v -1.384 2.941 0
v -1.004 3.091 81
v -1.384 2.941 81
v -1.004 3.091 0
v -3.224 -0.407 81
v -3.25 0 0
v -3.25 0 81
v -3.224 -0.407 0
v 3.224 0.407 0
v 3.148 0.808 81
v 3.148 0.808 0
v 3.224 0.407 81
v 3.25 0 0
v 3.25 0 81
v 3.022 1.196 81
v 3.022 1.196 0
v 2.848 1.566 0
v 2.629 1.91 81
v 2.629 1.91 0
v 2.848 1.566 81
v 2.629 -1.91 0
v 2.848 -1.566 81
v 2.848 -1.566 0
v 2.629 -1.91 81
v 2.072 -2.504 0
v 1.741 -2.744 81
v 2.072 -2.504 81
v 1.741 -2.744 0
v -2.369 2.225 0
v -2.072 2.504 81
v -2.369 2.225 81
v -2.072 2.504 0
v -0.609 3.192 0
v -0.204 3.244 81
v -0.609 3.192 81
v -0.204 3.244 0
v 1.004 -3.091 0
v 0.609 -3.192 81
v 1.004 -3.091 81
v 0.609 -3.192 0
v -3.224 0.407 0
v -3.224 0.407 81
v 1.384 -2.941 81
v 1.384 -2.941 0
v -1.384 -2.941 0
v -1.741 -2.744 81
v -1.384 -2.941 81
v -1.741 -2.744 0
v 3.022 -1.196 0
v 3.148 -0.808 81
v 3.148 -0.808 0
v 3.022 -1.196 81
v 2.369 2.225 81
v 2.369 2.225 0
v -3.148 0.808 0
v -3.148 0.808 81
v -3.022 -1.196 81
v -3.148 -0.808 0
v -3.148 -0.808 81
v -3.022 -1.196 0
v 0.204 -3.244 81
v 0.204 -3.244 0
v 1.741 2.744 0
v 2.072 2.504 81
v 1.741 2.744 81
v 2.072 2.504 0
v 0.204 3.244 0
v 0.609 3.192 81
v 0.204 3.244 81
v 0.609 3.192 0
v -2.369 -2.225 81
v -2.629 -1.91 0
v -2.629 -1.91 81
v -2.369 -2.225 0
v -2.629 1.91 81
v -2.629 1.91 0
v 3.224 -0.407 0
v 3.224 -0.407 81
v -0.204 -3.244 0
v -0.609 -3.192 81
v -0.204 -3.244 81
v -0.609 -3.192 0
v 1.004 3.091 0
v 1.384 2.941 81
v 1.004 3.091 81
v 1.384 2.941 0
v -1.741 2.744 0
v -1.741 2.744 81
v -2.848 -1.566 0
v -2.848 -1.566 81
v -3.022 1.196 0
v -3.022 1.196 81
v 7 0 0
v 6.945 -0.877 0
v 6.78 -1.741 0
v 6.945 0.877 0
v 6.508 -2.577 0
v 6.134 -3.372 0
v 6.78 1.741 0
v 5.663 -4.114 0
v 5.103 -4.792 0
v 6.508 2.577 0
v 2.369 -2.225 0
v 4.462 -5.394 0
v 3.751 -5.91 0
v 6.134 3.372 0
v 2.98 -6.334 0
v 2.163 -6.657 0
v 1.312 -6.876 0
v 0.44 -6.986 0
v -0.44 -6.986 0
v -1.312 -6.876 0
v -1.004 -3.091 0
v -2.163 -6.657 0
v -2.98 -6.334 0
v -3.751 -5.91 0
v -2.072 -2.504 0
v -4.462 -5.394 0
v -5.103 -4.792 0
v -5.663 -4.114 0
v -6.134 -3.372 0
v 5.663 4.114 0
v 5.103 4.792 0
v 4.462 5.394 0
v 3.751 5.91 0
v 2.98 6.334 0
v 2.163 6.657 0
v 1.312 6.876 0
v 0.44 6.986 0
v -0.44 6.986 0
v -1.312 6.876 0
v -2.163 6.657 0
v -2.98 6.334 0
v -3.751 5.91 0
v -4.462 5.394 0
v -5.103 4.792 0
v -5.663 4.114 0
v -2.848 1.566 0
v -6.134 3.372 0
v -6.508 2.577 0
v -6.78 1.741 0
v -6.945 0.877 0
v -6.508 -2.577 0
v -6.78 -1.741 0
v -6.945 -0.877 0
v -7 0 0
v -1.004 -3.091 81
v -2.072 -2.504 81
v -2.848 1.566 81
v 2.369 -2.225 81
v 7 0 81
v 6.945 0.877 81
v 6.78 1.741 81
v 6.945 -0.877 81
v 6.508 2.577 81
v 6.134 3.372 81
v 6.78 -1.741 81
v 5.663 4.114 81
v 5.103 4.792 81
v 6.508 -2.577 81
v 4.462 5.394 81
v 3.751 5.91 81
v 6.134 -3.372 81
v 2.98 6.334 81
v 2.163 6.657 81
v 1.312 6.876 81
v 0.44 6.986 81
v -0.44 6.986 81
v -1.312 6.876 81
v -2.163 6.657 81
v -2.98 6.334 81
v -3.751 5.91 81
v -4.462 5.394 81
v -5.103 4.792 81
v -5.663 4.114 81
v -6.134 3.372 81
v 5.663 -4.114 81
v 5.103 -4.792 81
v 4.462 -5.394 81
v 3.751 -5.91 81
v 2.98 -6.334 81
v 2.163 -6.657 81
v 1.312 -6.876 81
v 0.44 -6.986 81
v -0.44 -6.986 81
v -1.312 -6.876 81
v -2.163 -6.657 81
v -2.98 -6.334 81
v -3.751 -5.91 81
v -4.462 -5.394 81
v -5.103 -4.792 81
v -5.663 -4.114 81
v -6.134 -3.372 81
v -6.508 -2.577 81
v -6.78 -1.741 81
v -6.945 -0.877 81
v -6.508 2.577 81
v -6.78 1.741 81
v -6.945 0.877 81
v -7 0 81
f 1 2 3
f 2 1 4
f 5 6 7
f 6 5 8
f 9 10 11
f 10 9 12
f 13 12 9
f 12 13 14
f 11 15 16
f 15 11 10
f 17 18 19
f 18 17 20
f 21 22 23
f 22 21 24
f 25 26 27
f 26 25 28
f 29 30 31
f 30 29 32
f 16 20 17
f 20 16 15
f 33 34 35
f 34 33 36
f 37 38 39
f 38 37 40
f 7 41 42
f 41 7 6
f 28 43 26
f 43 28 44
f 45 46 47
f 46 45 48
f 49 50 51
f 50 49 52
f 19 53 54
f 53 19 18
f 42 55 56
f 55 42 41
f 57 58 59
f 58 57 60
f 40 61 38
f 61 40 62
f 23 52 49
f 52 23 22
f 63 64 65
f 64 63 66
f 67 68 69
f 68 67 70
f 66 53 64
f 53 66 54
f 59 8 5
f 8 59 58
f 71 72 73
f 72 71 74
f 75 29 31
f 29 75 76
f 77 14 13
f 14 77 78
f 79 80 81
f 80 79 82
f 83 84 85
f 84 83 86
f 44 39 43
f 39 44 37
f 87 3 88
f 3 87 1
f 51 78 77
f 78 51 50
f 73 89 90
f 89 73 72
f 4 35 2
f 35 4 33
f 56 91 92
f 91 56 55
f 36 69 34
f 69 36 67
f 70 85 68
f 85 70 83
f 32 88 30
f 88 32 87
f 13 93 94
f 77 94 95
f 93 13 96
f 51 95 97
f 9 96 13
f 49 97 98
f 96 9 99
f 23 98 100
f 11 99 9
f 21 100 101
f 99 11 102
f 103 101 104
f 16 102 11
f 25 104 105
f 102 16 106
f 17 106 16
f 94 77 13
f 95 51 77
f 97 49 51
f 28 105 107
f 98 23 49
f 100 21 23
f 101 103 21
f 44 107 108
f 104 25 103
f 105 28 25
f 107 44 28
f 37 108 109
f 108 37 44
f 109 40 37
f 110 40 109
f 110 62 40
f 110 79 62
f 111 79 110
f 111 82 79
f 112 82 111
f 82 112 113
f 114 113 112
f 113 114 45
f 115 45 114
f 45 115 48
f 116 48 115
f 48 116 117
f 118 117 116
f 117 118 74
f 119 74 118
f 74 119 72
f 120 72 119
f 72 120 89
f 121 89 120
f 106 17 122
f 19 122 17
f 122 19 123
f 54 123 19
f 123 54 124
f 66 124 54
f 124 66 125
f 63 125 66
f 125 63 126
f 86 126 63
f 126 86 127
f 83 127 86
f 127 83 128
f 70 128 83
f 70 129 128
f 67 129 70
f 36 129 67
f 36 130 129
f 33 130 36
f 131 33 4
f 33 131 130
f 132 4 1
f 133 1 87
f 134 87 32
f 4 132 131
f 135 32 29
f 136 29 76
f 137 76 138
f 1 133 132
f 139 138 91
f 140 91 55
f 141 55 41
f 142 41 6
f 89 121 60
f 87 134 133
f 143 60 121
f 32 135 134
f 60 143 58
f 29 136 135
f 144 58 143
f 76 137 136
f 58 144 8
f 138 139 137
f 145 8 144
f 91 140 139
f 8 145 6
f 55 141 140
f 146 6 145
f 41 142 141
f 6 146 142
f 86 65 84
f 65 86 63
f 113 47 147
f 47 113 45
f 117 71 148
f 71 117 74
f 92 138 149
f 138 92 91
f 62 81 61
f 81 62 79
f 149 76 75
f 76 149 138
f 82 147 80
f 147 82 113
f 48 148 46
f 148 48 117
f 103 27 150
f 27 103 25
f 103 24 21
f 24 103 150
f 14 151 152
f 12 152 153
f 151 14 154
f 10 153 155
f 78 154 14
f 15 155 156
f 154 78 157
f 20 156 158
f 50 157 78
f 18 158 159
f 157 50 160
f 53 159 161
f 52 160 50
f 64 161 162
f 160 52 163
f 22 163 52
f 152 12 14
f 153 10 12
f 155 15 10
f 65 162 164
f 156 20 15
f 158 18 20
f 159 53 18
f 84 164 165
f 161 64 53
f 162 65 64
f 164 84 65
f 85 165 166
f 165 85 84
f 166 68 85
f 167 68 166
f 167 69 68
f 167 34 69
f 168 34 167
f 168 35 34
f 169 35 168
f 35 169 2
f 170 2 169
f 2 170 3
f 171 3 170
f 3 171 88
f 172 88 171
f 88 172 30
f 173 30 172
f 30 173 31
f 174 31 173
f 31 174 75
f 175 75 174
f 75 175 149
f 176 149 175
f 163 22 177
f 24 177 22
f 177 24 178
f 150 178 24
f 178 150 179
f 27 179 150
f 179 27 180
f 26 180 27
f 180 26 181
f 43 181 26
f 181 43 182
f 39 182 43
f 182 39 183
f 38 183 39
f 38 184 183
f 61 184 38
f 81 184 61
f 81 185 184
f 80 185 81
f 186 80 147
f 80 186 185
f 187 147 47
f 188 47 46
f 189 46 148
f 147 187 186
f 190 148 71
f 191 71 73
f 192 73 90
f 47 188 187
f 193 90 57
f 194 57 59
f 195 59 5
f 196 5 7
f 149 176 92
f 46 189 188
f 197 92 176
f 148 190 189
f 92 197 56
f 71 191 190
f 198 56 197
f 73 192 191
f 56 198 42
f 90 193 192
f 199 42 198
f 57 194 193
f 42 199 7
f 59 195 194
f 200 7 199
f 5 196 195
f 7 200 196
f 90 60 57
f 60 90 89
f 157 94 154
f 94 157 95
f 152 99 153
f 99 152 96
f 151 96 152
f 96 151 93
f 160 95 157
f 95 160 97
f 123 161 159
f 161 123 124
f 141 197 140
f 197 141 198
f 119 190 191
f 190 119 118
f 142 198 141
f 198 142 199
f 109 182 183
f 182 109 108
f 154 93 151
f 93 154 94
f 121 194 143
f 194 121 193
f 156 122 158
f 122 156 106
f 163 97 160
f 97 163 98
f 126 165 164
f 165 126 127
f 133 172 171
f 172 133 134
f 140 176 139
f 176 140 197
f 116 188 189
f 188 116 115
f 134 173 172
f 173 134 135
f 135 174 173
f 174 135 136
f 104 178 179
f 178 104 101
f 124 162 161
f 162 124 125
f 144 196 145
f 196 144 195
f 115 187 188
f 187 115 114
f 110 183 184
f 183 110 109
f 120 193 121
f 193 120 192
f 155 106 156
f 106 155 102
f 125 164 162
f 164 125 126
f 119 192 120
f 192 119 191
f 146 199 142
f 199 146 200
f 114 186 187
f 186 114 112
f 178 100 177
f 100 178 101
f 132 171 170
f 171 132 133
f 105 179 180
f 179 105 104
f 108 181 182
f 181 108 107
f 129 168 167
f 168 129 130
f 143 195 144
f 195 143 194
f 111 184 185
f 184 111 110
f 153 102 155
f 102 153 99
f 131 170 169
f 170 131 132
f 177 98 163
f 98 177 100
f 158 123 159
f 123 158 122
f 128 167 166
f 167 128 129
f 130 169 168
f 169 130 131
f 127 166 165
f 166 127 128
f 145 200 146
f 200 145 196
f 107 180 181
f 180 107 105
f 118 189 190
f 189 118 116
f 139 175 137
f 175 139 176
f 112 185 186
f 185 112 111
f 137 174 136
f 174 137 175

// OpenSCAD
$fn = 50;


difference() {
	union() {
		cylinder(h = 81, r = 7.0000000000);
	}
	union() {
		cylinder(h = 81, r = 3.2500000000);
		cylinder(h = 81, r = 1.8000000000);
		cylinder(h = 81, r = 1.8000000000);
		cylinder(h = 81, r = 1.8000000000);
	}
}
